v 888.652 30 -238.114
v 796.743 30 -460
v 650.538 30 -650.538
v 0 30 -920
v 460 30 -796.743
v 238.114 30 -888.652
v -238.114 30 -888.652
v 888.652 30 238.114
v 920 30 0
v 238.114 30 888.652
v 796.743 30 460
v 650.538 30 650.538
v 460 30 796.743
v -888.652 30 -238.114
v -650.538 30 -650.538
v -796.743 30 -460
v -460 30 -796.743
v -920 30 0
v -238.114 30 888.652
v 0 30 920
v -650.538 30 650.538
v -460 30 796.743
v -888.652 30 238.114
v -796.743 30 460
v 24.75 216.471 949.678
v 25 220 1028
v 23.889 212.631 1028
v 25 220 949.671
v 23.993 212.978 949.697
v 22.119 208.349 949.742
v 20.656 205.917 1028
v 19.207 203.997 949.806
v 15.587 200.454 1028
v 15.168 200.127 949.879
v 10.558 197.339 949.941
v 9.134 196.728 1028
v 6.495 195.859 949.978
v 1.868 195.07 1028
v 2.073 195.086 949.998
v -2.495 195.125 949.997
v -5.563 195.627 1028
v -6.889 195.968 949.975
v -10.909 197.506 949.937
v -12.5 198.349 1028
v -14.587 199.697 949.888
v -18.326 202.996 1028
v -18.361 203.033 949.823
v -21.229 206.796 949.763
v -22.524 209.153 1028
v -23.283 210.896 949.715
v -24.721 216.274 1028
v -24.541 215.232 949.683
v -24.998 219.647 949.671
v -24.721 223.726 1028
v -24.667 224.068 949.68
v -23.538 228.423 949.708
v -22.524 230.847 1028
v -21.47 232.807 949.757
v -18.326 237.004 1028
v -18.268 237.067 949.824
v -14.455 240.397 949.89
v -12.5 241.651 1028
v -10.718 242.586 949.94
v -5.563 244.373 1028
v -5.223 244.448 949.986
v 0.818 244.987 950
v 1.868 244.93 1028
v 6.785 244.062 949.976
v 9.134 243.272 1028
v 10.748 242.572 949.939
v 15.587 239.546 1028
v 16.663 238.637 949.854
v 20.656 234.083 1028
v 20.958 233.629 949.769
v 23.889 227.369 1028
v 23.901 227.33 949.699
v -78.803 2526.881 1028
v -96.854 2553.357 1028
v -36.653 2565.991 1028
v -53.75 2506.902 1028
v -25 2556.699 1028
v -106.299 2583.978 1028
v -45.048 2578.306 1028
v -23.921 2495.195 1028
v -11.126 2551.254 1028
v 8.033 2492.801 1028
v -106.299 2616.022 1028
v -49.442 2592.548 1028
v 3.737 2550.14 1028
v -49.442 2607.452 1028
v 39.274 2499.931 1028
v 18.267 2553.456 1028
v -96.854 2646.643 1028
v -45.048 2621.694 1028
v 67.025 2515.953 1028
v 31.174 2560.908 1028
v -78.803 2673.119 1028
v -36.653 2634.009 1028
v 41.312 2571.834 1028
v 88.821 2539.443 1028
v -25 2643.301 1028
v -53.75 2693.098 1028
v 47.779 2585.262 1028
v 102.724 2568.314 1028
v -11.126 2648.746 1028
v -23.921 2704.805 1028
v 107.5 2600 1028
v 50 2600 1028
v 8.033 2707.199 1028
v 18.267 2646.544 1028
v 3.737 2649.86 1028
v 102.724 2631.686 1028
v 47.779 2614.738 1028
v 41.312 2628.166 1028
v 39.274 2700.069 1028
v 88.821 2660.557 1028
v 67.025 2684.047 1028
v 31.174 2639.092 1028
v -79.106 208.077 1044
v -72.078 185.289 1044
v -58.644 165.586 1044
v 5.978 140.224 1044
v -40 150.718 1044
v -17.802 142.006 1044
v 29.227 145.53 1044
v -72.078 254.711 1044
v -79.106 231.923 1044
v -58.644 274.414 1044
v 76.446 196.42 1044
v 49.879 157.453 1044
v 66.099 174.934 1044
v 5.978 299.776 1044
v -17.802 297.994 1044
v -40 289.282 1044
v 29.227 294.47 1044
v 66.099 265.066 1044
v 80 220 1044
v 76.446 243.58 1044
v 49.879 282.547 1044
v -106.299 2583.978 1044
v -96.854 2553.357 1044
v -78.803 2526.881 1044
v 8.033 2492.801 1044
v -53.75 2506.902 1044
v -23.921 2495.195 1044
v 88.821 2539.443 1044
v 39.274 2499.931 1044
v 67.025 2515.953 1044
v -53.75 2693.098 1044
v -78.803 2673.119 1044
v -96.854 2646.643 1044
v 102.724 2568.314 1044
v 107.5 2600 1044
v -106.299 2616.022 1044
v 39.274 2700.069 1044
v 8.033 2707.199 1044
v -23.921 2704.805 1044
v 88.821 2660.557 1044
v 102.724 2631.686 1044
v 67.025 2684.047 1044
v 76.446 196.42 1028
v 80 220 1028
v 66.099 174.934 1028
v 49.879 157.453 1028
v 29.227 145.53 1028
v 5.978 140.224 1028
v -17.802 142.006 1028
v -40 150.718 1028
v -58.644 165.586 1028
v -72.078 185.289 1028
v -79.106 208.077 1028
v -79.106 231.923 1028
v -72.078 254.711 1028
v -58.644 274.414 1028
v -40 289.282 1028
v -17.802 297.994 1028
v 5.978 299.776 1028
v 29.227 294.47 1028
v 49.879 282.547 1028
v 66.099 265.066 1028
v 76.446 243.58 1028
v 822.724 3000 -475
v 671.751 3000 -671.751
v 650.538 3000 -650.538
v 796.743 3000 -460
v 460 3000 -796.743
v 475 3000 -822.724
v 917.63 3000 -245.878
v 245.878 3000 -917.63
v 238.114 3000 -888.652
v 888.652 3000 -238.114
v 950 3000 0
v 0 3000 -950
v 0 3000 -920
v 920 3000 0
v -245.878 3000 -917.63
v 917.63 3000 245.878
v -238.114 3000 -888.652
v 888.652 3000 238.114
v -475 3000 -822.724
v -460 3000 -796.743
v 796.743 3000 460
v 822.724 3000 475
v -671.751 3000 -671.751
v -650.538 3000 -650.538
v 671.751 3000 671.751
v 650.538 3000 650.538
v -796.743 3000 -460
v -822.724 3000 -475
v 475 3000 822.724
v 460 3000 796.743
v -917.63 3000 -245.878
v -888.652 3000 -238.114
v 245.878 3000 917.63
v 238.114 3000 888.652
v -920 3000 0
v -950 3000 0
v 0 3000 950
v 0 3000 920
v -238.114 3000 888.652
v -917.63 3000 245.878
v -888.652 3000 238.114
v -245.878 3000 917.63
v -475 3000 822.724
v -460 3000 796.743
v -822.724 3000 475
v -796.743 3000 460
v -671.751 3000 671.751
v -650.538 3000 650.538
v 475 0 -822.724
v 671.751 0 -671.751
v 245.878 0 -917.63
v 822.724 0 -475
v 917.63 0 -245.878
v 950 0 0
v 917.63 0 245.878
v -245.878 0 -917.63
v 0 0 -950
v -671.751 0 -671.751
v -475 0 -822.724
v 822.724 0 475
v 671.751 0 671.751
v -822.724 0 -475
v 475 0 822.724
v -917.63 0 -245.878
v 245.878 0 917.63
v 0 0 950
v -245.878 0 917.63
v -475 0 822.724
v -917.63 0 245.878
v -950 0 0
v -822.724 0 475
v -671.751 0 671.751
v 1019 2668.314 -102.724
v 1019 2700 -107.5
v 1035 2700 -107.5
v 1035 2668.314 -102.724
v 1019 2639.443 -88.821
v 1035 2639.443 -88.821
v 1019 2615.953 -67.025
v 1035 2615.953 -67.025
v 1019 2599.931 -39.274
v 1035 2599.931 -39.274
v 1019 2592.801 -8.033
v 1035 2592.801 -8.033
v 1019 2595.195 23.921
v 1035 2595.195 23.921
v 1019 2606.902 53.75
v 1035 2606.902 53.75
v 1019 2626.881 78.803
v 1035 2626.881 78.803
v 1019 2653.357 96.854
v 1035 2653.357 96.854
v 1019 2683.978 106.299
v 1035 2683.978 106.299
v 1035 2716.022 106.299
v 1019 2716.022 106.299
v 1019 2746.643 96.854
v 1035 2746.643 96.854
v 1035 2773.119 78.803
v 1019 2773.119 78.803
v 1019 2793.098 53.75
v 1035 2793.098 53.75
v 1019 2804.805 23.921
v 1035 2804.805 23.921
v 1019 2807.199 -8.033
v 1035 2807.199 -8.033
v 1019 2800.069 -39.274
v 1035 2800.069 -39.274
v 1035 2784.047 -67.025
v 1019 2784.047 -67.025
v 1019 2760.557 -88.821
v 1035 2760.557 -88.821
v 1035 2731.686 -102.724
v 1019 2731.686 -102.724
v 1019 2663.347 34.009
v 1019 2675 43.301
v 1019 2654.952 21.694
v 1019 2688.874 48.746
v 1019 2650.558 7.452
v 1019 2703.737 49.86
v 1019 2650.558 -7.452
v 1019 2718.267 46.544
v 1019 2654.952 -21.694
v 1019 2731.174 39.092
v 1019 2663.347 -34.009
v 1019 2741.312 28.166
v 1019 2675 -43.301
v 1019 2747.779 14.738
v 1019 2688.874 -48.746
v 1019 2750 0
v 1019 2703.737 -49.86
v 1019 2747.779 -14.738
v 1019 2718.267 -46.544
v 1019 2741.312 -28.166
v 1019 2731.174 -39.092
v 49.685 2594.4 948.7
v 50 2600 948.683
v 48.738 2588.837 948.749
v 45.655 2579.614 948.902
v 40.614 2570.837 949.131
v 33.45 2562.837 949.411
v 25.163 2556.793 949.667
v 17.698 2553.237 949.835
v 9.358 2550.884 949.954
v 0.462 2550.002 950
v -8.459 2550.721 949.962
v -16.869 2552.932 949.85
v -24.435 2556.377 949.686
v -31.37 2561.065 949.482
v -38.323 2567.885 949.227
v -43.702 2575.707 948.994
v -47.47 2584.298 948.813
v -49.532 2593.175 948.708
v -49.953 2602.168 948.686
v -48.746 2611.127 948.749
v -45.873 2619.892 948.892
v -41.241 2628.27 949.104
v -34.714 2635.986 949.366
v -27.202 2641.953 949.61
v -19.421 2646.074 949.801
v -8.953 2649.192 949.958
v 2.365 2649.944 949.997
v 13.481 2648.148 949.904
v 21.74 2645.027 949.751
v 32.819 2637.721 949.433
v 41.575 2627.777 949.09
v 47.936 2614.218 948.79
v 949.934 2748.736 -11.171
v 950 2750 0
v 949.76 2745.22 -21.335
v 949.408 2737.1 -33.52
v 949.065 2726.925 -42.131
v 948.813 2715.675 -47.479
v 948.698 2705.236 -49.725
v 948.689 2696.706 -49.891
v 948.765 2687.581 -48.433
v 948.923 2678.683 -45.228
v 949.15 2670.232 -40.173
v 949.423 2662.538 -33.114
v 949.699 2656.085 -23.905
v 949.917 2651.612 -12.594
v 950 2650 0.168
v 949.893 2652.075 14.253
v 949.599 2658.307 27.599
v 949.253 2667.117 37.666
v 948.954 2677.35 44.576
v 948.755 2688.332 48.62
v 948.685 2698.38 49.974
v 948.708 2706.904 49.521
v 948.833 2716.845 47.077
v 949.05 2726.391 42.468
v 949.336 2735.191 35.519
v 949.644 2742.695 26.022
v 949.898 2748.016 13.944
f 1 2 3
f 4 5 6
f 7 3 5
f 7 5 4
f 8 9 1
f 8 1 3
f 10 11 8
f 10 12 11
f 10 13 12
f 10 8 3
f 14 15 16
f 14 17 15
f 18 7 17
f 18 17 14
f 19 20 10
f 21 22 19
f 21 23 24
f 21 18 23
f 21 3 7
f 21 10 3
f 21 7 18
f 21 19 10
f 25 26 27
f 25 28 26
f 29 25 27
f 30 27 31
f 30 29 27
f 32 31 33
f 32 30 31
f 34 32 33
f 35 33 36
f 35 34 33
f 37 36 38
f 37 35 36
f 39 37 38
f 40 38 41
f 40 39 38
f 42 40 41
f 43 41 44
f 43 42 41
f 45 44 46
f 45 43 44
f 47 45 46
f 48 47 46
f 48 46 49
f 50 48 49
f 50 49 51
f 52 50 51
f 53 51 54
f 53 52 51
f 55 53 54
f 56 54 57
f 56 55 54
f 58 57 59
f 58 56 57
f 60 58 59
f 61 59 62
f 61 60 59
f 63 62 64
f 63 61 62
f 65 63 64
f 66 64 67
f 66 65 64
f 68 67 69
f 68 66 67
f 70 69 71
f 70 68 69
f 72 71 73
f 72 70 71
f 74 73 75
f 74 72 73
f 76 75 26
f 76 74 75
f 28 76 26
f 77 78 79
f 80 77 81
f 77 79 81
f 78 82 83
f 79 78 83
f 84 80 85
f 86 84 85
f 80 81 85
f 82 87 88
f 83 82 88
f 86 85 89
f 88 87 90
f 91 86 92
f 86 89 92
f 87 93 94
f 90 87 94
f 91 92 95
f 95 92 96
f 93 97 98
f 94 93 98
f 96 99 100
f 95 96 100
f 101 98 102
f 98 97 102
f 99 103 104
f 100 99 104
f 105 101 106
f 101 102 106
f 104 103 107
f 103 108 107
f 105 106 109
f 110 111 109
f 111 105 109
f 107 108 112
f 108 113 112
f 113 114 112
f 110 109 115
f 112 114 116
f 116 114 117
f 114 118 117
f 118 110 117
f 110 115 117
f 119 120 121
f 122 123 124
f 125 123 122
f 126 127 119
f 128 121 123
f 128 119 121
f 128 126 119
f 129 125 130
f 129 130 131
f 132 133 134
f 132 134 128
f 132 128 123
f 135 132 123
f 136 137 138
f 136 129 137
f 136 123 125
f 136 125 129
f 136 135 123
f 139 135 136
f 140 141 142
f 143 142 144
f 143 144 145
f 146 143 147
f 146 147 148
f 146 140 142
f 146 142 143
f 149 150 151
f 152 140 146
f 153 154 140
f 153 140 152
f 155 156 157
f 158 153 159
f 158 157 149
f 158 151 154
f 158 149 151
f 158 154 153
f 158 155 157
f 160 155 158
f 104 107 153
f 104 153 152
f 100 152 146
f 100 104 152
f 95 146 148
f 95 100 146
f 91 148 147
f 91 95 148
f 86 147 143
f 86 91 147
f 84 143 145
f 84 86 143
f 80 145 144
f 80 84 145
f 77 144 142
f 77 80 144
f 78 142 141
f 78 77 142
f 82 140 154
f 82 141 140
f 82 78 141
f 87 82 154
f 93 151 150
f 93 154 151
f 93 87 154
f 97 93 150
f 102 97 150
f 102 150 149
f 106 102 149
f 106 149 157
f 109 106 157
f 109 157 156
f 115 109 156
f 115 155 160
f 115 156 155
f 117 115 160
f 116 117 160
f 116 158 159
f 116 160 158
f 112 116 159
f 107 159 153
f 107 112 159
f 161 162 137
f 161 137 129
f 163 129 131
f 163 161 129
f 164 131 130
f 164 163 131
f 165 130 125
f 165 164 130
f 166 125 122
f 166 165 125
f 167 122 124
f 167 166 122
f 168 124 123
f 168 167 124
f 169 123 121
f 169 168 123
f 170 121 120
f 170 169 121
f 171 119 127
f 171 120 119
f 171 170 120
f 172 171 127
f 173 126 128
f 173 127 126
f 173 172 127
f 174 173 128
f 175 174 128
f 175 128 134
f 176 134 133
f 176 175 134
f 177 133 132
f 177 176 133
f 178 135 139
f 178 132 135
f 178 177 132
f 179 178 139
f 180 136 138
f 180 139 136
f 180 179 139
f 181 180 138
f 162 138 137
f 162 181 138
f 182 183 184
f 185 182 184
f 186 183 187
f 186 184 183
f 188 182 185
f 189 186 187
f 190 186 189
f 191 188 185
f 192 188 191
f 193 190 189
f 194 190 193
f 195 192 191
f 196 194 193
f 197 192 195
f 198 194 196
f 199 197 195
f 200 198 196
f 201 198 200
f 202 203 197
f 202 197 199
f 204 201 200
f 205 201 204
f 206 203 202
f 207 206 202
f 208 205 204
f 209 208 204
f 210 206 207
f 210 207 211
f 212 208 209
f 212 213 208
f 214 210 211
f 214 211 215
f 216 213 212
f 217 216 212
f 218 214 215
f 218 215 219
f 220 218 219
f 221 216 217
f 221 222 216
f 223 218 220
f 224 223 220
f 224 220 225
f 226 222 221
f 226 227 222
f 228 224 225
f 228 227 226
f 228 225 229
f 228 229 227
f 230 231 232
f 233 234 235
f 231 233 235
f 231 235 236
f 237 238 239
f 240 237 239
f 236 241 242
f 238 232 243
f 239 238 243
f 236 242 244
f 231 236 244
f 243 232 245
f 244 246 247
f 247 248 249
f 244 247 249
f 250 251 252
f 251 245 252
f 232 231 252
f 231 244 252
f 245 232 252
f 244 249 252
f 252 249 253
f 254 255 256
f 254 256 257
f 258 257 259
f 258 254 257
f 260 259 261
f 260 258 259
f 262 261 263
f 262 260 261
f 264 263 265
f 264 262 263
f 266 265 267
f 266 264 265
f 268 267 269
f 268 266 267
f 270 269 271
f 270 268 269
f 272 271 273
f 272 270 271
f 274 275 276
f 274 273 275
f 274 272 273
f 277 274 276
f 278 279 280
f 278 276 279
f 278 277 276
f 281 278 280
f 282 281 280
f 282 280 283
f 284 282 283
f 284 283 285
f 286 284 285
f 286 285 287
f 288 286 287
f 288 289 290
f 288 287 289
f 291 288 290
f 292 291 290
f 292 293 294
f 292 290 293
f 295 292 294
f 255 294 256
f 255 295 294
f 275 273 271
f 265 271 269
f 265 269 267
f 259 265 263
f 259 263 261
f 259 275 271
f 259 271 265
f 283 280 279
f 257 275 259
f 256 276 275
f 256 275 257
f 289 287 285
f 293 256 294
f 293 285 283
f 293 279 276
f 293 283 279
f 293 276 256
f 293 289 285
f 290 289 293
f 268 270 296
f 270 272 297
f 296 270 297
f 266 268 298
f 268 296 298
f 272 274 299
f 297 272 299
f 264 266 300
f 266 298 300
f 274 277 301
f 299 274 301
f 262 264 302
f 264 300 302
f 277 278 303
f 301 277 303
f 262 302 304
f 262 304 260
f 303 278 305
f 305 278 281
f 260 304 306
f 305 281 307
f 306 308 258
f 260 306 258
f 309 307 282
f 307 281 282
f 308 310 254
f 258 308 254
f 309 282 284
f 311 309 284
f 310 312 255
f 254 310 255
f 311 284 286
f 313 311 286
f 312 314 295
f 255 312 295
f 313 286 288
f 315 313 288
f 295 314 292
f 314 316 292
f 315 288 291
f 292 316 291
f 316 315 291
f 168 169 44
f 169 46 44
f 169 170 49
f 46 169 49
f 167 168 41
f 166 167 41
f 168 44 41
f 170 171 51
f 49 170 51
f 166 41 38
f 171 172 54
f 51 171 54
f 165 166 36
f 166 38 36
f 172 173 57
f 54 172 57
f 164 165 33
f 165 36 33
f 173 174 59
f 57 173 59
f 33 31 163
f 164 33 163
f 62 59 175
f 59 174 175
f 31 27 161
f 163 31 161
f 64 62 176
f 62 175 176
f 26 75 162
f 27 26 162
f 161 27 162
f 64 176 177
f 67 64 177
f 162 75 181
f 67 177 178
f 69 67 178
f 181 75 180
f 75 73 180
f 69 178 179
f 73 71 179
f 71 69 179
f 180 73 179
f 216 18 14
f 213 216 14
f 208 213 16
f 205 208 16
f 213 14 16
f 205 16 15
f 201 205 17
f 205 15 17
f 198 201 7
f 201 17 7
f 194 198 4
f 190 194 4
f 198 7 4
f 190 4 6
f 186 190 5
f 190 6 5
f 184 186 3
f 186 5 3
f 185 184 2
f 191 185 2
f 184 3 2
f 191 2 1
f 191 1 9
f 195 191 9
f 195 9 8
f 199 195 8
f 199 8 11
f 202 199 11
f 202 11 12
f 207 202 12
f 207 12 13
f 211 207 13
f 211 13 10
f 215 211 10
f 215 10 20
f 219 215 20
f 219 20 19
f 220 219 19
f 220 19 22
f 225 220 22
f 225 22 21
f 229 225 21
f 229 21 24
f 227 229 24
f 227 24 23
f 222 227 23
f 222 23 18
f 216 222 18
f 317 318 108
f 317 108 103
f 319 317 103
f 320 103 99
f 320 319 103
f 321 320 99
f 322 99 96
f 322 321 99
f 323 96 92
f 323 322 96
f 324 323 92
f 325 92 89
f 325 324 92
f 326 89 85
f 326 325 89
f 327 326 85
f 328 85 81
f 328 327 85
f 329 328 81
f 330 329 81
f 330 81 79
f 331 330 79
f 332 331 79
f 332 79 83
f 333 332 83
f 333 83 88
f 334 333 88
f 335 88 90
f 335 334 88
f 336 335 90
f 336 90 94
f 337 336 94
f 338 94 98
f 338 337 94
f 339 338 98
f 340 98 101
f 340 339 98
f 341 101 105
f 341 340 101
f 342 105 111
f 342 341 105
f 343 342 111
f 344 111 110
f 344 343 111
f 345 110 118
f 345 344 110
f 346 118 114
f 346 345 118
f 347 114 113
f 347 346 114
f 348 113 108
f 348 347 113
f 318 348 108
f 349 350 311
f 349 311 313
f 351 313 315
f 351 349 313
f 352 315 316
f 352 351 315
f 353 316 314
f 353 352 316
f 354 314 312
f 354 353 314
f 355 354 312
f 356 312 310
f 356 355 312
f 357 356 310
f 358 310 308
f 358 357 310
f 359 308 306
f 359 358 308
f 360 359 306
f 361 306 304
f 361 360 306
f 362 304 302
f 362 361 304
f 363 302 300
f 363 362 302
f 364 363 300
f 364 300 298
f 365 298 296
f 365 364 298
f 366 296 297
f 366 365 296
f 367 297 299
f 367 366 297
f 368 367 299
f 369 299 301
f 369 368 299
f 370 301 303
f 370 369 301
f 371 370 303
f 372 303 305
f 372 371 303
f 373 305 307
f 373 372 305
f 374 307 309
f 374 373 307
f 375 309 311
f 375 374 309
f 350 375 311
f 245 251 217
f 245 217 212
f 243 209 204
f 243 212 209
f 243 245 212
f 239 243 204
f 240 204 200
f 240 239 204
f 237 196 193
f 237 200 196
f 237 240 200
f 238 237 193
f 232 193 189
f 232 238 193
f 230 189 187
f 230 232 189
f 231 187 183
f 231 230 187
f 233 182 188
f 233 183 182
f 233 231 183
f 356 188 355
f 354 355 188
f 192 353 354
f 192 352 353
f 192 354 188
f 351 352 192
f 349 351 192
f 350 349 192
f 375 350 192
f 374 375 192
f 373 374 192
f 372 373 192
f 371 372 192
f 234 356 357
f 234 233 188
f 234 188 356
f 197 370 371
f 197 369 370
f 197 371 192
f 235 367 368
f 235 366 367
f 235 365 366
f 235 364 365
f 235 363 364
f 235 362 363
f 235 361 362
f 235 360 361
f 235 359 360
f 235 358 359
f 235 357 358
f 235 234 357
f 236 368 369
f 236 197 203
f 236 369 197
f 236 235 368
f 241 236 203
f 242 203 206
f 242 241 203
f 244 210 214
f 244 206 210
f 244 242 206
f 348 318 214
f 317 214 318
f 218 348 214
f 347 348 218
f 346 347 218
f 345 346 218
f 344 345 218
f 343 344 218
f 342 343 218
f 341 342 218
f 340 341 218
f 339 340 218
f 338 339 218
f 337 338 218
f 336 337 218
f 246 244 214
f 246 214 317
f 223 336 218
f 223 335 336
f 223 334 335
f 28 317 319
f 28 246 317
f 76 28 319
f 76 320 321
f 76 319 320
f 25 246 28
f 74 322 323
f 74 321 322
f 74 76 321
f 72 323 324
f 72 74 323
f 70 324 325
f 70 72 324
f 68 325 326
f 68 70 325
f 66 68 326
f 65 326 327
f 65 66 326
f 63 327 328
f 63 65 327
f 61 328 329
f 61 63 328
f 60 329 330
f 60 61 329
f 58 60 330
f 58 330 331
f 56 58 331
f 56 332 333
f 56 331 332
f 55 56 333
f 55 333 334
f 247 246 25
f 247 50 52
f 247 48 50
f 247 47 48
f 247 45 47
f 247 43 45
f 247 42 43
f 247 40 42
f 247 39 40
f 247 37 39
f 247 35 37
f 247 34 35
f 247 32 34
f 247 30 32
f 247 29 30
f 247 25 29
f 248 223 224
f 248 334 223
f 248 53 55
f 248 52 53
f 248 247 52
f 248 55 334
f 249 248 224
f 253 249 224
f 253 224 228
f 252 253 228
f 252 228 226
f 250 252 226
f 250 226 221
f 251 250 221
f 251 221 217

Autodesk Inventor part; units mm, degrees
ref_plane "XZ Plane" through (0, 0, 0) normal (0, 1, 0) x (-1, 0, 0)
sketch "Sketch1" plane through (0, 0, 0) normal (0, 1, 0) x (-1, 0, 0)
  circle A0 centre (0, 0) radius 950
  dimension "d0" = 1900
extrude "Extrusion1" add sketch "Sketch1" along normal blind 3000
shell "Shell1" thickness 30 removed faces 1 at (-141.3202, 3000, -425.0369)
ref_plane "Work Plane1" through (0, 0, 935) normal (0, 0, 1) x (1, 0, 0)
sketch "Sketch2" plane through (0, 0, 935) normal (0, 0, 1) x (1, 0, 0)
  circle A0 centre (0, 220) radius 25
  line L0 (950, 0) -> (-950, 0) projected
  point P0 (0, 0)
  point P1 (0, 0)
  dimension "d5" = 50
  dimension "d7" = 220
extrude "Extrusion2" add sketch "Sketch2" along normal blind 93
sketch "Sketch4" plane through (0, 0, 935) normal (0, 0, 1) x (1, 0, 0)
  circle A0 centre (0, 2600) radius 50
  point P0 (0, 0)
  dimension "d12" = 100
  dimension "d13" = 2600
extrude "Extrusion3" add sketch "Sketch4" along normal blind 93
ref_plane "Work Plane3" through (935, 0, 0) normal (1, 0, 0) x (0, 1, 0)
sketch "Sketch5" plane through (935, 0, 0) normal (1, 0, 0) x (0, 1, 0)
  circle A0 centre (2700, 0) radius 50
  point P0 (0, 0)
  dimension "d17" = 100
  dimension "d18" = 2700
extrude "Extrusion4" add sketch "Sketch5" along normal blind 84
sketch "Sketch6" plane through (1019, 2700, 0) normal (1, 0, 0) x (0, 0, -1)
  circle A0 centre (0, 0) radius 107.5
  circle A1 centre (0, 0) radius 50 projected
  point P0 (0, -2700)
  dimension "d21" = 215
extrude "Extrusion5" add sketch "Sketch6" along normal blind 16 contours A0 | A1
sketch "Sketch7" plane through (0, 2600, 1028) normal (0, 0, 1) x (1, 0, 0)
  circle A0 centre (0, 0) radius 50 projected
  circle A1 centre (0, 0) radius 107.5
  point P0 (0, -2600)
  dimension "d24" = 215
extrude "Extrusion6" add sketch "Sketch7" along normal blind 16 contours A0 | A1
sketch "Sketch8" plane through (0, 220, 1028) normal (0, 0, 1) x (1, 0, 0)
  circle A0 centre (0, 0) radius 25 projected
  circle A1 centre (0, 0) radius 80
  point P0 (0, -220)
  dimension "d27" = 160
extrude "Extrusion7" add sketch "Sketch8" along normal blind 16 contours A0 | A1
properties part number "Резервуар сбора осветленной воды"
